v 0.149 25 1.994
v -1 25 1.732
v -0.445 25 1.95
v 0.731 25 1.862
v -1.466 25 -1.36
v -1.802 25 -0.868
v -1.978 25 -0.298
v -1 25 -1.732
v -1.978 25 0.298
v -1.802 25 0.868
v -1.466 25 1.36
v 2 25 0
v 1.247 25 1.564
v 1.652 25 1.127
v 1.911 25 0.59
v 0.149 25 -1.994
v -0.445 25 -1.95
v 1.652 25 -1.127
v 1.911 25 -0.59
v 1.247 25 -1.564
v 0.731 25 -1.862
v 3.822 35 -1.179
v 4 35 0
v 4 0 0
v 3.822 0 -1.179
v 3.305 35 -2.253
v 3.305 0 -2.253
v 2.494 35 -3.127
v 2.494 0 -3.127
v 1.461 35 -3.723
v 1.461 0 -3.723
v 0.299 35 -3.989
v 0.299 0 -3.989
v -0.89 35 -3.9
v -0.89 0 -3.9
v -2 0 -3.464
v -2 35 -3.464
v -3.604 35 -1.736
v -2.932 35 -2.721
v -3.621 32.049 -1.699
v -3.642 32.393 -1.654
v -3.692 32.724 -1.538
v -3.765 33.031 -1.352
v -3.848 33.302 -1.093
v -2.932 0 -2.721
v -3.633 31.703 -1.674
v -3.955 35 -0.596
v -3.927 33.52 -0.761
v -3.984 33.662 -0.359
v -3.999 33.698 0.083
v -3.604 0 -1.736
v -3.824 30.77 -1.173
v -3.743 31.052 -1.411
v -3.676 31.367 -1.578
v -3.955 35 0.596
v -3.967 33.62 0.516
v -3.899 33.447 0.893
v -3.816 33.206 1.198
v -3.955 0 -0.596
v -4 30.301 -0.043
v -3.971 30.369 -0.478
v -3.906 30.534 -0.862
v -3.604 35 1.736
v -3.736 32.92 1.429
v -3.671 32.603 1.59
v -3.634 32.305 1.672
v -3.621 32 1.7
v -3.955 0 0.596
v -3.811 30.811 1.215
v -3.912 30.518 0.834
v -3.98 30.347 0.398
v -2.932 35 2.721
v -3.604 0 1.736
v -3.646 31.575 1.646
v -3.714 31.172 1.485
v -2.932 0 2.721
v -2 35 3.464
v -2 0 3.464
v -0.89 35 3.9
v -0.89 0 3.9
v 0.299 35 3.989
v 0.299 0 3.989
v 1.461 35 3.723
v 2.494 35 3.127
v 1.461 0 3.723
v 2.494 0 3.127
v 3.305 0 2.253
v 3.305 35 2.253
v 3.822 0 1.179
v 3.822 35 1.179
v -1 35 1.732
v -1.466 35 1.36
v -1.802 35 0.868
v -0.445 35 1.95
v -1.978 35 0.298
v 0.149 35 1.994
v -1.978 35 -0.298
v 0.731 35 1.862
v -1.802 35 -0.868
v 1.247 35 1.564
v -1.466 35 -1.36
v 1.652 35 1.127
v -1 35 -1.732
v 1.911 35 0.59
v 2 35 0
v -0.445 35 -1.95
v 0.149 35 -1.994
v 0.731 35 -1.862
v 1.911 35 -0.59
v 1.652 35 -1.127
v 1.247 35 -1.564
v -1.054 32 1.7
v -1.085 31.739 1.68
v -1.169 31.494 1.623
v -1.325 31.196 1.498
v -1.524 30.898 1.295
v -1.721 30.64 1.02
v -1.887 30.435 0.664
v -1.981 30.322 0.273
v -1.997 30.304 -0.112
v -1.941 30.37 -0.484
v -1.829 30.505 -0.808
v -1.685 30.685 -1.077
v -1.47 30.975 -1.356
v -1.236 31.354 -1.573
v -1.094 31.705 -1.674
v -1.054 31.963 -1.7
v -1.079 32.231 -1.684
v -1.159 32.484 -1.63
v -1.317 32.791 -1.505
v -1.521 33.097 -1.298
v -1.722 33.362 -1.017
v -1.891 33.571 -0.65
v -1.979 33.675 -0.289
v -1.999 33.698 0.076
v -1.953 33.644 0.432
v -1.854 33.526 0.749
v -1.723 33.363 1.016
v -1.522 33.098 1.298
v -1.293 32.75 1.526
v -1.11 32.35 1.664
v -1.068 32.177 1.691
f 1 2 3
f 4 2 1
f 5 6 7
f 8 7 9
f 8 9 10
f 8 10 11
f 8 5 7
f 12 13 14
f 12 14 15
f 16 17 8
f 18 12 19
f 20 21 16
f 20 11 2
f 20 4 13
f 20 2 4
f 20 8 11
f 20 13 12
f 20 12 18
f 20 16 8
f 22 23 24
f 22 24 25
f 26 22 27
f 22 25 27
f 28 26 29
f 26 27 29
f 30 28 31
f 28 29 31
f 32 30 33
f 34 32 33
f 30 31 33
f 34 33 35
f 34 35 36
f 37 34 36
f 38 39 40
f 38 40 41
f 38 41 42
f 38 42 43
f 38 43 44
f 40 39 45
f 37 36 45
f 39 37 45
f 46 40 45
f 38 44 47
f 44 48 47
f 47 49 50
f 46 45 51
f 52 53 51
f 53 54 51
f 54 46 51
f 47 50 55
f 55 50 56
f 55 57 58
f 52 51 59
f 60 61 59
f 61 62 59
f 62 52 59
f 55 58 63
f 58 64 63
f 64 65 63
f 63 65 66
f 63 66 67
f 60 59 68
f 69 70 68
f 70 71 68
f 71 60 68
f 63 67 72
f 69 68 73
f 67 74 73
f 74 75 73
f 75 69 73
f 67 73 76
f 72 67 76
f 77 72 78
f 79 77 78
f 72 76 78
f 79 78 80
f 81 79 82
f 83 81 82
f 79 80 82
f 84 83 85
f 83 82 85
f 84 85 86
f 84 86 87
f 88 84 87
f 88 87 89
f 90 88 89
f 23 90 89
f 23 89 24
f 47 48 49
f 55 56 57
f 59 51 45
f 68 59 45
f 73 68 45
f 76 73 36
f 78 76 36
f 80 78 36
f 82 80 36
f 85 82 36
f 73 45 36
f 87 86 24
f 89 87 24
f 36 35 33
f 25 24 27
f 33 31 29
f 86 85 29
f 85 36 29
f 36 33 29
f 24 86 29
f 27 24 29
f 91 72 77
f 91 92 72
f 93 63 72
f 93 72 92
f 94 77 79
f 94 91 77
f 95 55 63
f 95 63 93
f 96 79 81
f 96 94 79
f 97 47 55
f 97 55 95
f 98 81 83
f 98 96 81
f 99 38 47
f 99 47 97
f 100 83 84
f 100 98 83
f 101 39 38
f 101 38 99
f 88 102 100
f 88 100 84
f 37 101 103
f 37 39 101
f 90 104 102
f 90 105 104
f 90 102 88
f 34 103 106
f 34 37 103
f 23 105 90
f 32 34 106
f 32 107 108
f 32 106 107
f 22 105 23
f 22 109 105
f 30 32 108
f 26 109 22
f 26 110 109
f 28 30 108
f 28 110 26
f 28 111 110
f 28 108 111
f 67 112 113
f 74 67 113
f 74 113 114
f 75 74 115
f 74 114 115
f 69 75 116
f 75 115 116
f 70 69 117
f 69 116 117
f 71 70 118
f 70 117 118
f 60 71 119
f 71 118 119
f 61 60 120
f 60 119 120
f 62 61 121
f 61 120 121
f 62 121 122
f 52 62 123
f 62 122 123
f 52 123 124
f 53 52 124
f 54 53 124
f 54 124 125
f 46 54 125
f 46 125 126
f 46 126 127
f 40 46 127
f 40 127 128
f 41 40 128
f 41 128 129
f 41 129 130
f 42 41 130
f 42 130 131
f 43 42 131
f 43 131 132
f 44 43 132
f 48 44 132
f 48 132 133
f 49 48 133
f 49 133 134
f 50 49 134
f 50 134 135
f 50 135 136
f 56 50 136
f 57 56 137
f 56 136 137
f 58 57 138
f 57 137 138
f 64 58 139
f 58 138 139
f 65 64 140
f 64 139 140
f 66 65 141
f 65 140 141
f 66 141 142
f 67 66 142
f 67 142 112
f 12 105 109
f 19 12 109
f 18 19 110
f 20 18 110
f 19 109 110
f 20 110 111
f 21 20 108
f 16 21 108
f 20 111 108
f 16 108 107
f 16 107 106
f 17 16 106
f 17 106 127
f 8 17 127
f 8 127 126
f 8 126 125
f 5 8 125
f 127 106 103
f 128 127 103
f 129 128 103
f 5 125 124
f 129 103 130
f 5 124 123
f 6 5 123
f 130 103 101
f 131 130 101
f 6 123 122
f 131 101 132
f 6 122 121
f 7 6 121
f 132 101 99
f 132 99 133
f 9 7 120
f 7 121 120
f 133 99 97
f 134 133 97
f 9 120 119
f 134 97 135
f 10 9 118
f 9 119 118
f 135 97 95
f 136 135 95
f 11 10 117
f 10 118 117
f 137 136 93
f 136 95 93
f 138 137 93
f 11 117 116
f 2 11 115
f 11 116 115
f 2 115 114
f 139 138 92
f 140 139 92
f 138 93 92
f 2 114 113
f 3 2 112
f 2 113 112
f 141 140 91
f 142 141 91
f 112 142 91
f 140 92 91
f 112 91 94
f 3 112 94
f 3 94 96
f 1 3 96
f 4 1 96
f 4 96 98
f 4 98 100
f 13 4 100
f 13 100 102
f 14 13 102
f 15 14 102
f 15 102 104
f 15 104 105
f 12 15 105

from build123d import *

# Parameters (mm, degrees)
CROQUIS1_R                       = 4
SALIENTE_EXTRUIR1_DEPTH          = 35
CROQUIS2_R                       = 2
CORTAR_EXTRUIR1_DEPTH            = 10
TALADRO_DE_MARGEN_PARA_M31_D     = 3.4
TALADRO_DE_MARGEN_PARA_M31_DEPTH = 3
TALADRO_DE_MARGEN_PARA_M31_TIP   = 1.021463052


with BuildPart() as part:
    # Croquis1 → Saliente-Extruir1 (new body)
    with BuildSketch(Plane(origin=(0, 0, 0), x_dir=(1, 0, 0), z_dir=(0, 1, 0))):
        Circle(CROQUIS1_R)
    extrude(amount=SALIENTE_EXTRUIR1_DEPTH)

    # Croquis2 → Cortar-Extruir1 (cut)
    with BuildSketch(Plane(origin=(0, 35, 0), x_dir=(1, 0, 0), z_dir=(0, 1, 0))):
        Circle(CROQUIS2_R)
    extrude(amount=-CORTAR_EXTRUIR1_DEPTH, mode=Mode.SUBTRACT)

    # Taladro de margen para M31
    with Locations(Plane(origin=(-4, 32, 0), x_dir=(0, 0, -1), z_dir=(-1, 0, 0))):
        with Locations((0, 0)):
            Hole(TALADRO_DE_MARGEN_PARA_M31_D / 2, depth=TALADRO_DE_MARGEN_PARA_M31_DEPTH)
            with Locations((0, 0, -(TALADRO_DE_MARGEN_PARA_M31_DEPTH + TALADRO_DE_MARGEN_PARA_M31_TIP / 2))):  # 118° drill point
                Cone(0, TALADRO_DE_MARGEN_PARA_M31_D / 2, TALADRO_DE_MARGEN_PARA_M31_TIP, mode=Mode.SUBTRACT)


solid = part.part
